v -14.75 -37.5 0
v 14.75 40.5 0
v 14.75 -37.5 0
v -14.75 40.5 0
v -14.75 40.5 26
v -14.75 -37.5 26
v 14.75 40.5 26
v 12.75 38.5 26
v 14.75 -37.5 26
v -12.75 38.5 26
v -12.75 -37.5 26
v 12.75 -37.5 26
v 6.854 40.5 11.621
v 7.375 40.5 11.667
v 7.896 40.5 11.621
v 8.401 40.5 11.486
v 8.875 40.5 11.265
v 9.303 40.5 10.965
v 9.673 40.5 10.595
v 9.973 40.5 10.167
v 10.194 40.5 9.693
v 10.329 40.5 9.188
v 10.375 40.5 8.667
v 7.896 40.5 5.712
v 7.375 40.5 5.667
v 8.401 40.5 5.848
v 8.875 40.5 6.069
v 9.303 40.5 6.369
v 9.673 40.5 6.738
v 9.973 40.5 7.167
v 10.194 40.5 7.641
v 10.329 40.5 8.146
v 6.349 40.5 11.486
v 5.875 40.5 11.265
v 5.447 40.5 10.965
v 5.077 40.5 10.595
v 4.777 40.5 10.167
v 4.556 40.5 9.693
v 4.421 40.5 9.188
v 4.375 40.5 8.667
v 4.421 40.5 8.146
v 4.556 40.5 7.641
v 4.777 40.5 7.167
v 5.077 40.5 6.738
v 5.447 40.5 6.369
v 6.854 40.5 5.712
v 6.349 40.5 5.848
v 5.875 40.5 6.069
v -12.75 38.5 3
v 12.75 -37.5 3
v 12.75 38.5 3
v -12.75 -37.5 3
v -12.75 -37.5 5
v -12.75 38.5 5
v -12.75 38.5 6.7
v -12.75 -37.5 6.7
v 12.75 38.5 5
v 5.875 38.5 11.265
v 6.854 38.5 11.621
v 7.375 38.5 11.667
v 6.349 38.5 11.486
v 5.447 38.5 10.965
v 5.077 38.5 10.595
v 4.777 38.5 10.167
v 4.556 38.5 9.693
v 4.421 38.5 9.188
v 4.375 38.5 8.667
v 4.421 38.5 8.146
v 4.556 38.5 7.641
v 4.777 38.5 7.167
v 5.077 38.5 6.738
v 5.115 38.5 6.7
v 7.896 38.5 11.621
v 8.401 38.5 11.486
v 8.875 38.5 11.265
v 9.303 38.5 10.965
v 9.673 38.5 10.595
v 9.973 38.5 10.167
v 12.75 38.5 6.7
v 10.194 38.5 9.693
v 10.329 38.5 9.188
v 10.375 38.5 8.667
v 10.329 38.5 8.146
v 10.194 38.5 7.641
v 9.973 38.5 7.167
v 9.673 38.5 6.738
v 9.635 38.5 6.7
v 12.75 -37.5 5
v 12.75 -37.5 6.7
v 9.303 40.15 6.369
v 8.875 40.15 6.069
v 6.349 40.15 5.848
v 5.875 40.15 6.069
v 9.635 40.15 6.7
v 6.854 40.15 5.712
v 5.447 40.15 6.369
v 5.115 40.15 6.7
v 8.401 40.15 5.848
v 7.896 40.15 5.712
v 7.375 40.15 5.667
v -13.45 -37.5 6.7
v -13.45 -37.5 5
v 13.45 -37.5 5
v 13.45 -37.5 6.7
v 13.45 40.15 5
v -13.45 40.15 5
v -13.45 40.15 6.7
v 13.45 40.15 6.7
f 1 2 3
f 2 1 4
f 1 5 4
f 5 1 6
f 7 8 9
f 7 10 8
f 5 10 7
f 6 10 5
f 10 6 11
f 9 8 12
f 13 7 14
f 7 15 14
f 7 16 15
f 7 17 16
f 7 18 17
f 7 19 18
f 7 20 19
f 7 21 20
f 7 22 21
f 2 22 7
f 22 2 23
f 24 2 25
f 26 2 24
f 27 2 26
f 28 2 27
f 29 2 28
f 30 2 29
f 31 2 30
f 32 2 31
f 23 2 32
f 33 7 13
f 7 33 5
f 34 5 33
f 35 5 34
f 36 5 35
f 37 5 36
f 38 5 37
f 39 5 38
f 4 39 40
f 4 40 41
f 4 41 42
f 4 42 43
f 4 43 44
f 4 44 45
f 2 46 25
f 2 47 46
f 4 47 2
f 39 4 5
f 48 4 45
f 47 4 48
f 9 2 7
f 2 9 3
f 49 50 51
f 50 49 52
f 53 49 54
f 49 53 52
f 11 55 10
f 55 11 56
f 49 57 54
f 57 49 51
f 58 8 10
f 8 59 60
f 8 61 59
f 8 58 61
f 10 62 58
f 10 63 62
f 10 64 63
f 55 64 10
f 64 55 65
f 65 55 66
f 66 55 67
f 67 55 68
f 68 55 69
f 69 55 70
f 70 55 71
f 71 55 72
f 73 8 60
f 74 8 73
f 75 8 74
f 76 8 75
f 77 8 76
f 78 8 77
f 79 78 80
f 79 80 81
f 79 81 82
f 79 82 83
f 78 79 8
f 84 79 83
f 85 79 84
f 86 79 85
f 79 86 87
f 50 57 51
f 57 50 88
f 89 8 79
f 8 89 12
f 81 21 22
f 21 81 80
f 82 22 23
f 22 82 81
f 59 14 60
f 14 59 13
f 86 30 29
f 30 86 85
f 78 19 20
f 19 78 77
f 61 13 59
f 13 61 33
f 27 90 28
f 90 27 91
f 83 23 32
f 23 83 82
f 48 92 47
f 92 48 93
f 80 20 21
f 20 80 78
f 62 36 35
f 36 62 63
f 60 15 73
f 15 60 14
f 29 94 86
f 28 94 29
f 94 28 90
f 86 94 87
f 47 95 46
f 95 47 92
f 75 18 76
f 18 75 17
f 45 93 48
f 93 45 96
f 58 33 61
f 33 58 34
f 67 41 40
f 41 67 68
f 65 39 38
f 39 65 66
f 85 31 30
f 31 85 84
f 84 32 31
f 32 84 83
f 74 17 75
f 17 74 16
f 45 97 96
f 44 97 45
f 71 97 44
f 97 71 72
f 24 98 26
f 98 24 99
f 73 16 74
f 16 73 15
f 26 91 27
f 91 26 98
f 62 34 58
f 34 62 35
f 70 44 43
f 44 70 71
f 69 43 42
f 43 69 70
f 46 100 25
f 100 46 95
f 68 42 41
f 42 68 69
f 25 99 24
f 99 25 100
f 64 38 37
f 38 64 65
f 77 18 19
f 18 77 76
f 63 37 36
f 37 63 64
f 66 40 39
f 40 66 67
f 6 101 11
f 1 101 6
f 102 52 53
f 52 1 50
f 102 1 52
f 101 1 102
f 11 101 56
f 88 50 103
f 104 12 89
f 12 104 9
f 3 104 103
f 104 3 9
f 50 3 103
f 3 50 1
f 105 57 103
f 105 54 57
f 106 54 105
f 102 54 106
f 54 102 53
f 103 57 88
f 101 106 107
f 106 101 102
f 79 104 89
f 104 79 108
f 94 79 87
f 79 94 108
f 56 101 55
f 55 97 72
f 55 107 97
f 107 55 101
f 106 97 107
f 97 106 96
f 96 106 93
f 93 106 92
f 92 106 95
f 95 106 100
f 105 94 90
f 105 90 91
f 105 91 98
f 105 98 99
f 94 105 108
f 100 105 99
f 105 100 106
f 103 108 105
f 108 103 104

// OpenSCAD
// file: vars-charger-slotted.scad
echo(version=version());
//All dimensions are in mm
wall=2;  // wall thickness

l = 81; // lenght of box in x dir
w = 25.5+2*wall ;  // width of box in y dir
h=26;    // height of box without lid
postloc_x=11; // where the edge posts are in x direction
postloc_y=23.5; // where the edge posts are in y direction
postradius=2.5 ;  //Dimension of posts in x and y
postholeradius=1.35;
postheight=7;
basethickness=3;
slotThickness = 1.7;
recess=.7;
holdslotloc=81.5;
holdslotwidth=10;
wireholddiameter = 6;
switchcutout = [28,22];
//Perforation size: 23mm*10.5mm
voltmetercutout=[24,11.5];
// Allow for slip by making the ridge a little smaller than the box it fits into.
interference=0.8;
// main file
include <vars-charger-slotted.scad>;
// simple 2D -> 3D extrusion of a rectangle
color("red")
   difference() {
        linear_extrude(height = h)
            square([w, l
            ], center = true);
       translate ([0,0,basethickness])
         linear_extrude(height = h)
            square([w-2*wall, l-2*wall
            ], center = true)   ;
    translate([w/4,l/2+1,h/3])
    rotate([90,0,0])
    cylinder(h = wall*2,
            r1 = wireholddiameter/2,
            r2 = wireholddiameter/2,
            $fn = 36,
            center = false);
    translate([-w/4,-l/2+wall+1,h/3])
    rotate([90,0,0])
    cylinder(h = wall*3,
            r1 = wireholddiameter/2,
            r2 = wireholddiameter/2,
            $fn = 36,
            center = false);
    translate ([0,-l/2+1,-.10])
      linear_extrude(height=h+1)
        square([l, 2*wall],center=true);
    color("blue")
    translate([0,0,basethickness+2])
    linear_extrude(height=slotThickness)
    square([w-2*wall + recess*2,l-recess],center=true);

      }


/*
mountpost( postloc_x, postloc_y);
mountpost( postloc_x,-postloc_y);
mountpost(-postloc_x,postloc_y);
mountpost(-postloc_x,-postloc_y);
*/
module mountpost(x=0,y=0, postcolor="blue") {
    color(postcolor)
    translate ([x,y,basethickness])
   difference() {
     linear_extrude(height = postheight)
       square([2*postradius,2*postradius], center = true);
    //cylinder(h=postheight, r1=postradius, r2=postradius,  $fn = 12,center = false);
    translate ([0,0,-1])
    cylinder(h=postheight+2, r1=postholeradius, r2=postholeradius,
             $fn = 12, center = false);
   }

}
